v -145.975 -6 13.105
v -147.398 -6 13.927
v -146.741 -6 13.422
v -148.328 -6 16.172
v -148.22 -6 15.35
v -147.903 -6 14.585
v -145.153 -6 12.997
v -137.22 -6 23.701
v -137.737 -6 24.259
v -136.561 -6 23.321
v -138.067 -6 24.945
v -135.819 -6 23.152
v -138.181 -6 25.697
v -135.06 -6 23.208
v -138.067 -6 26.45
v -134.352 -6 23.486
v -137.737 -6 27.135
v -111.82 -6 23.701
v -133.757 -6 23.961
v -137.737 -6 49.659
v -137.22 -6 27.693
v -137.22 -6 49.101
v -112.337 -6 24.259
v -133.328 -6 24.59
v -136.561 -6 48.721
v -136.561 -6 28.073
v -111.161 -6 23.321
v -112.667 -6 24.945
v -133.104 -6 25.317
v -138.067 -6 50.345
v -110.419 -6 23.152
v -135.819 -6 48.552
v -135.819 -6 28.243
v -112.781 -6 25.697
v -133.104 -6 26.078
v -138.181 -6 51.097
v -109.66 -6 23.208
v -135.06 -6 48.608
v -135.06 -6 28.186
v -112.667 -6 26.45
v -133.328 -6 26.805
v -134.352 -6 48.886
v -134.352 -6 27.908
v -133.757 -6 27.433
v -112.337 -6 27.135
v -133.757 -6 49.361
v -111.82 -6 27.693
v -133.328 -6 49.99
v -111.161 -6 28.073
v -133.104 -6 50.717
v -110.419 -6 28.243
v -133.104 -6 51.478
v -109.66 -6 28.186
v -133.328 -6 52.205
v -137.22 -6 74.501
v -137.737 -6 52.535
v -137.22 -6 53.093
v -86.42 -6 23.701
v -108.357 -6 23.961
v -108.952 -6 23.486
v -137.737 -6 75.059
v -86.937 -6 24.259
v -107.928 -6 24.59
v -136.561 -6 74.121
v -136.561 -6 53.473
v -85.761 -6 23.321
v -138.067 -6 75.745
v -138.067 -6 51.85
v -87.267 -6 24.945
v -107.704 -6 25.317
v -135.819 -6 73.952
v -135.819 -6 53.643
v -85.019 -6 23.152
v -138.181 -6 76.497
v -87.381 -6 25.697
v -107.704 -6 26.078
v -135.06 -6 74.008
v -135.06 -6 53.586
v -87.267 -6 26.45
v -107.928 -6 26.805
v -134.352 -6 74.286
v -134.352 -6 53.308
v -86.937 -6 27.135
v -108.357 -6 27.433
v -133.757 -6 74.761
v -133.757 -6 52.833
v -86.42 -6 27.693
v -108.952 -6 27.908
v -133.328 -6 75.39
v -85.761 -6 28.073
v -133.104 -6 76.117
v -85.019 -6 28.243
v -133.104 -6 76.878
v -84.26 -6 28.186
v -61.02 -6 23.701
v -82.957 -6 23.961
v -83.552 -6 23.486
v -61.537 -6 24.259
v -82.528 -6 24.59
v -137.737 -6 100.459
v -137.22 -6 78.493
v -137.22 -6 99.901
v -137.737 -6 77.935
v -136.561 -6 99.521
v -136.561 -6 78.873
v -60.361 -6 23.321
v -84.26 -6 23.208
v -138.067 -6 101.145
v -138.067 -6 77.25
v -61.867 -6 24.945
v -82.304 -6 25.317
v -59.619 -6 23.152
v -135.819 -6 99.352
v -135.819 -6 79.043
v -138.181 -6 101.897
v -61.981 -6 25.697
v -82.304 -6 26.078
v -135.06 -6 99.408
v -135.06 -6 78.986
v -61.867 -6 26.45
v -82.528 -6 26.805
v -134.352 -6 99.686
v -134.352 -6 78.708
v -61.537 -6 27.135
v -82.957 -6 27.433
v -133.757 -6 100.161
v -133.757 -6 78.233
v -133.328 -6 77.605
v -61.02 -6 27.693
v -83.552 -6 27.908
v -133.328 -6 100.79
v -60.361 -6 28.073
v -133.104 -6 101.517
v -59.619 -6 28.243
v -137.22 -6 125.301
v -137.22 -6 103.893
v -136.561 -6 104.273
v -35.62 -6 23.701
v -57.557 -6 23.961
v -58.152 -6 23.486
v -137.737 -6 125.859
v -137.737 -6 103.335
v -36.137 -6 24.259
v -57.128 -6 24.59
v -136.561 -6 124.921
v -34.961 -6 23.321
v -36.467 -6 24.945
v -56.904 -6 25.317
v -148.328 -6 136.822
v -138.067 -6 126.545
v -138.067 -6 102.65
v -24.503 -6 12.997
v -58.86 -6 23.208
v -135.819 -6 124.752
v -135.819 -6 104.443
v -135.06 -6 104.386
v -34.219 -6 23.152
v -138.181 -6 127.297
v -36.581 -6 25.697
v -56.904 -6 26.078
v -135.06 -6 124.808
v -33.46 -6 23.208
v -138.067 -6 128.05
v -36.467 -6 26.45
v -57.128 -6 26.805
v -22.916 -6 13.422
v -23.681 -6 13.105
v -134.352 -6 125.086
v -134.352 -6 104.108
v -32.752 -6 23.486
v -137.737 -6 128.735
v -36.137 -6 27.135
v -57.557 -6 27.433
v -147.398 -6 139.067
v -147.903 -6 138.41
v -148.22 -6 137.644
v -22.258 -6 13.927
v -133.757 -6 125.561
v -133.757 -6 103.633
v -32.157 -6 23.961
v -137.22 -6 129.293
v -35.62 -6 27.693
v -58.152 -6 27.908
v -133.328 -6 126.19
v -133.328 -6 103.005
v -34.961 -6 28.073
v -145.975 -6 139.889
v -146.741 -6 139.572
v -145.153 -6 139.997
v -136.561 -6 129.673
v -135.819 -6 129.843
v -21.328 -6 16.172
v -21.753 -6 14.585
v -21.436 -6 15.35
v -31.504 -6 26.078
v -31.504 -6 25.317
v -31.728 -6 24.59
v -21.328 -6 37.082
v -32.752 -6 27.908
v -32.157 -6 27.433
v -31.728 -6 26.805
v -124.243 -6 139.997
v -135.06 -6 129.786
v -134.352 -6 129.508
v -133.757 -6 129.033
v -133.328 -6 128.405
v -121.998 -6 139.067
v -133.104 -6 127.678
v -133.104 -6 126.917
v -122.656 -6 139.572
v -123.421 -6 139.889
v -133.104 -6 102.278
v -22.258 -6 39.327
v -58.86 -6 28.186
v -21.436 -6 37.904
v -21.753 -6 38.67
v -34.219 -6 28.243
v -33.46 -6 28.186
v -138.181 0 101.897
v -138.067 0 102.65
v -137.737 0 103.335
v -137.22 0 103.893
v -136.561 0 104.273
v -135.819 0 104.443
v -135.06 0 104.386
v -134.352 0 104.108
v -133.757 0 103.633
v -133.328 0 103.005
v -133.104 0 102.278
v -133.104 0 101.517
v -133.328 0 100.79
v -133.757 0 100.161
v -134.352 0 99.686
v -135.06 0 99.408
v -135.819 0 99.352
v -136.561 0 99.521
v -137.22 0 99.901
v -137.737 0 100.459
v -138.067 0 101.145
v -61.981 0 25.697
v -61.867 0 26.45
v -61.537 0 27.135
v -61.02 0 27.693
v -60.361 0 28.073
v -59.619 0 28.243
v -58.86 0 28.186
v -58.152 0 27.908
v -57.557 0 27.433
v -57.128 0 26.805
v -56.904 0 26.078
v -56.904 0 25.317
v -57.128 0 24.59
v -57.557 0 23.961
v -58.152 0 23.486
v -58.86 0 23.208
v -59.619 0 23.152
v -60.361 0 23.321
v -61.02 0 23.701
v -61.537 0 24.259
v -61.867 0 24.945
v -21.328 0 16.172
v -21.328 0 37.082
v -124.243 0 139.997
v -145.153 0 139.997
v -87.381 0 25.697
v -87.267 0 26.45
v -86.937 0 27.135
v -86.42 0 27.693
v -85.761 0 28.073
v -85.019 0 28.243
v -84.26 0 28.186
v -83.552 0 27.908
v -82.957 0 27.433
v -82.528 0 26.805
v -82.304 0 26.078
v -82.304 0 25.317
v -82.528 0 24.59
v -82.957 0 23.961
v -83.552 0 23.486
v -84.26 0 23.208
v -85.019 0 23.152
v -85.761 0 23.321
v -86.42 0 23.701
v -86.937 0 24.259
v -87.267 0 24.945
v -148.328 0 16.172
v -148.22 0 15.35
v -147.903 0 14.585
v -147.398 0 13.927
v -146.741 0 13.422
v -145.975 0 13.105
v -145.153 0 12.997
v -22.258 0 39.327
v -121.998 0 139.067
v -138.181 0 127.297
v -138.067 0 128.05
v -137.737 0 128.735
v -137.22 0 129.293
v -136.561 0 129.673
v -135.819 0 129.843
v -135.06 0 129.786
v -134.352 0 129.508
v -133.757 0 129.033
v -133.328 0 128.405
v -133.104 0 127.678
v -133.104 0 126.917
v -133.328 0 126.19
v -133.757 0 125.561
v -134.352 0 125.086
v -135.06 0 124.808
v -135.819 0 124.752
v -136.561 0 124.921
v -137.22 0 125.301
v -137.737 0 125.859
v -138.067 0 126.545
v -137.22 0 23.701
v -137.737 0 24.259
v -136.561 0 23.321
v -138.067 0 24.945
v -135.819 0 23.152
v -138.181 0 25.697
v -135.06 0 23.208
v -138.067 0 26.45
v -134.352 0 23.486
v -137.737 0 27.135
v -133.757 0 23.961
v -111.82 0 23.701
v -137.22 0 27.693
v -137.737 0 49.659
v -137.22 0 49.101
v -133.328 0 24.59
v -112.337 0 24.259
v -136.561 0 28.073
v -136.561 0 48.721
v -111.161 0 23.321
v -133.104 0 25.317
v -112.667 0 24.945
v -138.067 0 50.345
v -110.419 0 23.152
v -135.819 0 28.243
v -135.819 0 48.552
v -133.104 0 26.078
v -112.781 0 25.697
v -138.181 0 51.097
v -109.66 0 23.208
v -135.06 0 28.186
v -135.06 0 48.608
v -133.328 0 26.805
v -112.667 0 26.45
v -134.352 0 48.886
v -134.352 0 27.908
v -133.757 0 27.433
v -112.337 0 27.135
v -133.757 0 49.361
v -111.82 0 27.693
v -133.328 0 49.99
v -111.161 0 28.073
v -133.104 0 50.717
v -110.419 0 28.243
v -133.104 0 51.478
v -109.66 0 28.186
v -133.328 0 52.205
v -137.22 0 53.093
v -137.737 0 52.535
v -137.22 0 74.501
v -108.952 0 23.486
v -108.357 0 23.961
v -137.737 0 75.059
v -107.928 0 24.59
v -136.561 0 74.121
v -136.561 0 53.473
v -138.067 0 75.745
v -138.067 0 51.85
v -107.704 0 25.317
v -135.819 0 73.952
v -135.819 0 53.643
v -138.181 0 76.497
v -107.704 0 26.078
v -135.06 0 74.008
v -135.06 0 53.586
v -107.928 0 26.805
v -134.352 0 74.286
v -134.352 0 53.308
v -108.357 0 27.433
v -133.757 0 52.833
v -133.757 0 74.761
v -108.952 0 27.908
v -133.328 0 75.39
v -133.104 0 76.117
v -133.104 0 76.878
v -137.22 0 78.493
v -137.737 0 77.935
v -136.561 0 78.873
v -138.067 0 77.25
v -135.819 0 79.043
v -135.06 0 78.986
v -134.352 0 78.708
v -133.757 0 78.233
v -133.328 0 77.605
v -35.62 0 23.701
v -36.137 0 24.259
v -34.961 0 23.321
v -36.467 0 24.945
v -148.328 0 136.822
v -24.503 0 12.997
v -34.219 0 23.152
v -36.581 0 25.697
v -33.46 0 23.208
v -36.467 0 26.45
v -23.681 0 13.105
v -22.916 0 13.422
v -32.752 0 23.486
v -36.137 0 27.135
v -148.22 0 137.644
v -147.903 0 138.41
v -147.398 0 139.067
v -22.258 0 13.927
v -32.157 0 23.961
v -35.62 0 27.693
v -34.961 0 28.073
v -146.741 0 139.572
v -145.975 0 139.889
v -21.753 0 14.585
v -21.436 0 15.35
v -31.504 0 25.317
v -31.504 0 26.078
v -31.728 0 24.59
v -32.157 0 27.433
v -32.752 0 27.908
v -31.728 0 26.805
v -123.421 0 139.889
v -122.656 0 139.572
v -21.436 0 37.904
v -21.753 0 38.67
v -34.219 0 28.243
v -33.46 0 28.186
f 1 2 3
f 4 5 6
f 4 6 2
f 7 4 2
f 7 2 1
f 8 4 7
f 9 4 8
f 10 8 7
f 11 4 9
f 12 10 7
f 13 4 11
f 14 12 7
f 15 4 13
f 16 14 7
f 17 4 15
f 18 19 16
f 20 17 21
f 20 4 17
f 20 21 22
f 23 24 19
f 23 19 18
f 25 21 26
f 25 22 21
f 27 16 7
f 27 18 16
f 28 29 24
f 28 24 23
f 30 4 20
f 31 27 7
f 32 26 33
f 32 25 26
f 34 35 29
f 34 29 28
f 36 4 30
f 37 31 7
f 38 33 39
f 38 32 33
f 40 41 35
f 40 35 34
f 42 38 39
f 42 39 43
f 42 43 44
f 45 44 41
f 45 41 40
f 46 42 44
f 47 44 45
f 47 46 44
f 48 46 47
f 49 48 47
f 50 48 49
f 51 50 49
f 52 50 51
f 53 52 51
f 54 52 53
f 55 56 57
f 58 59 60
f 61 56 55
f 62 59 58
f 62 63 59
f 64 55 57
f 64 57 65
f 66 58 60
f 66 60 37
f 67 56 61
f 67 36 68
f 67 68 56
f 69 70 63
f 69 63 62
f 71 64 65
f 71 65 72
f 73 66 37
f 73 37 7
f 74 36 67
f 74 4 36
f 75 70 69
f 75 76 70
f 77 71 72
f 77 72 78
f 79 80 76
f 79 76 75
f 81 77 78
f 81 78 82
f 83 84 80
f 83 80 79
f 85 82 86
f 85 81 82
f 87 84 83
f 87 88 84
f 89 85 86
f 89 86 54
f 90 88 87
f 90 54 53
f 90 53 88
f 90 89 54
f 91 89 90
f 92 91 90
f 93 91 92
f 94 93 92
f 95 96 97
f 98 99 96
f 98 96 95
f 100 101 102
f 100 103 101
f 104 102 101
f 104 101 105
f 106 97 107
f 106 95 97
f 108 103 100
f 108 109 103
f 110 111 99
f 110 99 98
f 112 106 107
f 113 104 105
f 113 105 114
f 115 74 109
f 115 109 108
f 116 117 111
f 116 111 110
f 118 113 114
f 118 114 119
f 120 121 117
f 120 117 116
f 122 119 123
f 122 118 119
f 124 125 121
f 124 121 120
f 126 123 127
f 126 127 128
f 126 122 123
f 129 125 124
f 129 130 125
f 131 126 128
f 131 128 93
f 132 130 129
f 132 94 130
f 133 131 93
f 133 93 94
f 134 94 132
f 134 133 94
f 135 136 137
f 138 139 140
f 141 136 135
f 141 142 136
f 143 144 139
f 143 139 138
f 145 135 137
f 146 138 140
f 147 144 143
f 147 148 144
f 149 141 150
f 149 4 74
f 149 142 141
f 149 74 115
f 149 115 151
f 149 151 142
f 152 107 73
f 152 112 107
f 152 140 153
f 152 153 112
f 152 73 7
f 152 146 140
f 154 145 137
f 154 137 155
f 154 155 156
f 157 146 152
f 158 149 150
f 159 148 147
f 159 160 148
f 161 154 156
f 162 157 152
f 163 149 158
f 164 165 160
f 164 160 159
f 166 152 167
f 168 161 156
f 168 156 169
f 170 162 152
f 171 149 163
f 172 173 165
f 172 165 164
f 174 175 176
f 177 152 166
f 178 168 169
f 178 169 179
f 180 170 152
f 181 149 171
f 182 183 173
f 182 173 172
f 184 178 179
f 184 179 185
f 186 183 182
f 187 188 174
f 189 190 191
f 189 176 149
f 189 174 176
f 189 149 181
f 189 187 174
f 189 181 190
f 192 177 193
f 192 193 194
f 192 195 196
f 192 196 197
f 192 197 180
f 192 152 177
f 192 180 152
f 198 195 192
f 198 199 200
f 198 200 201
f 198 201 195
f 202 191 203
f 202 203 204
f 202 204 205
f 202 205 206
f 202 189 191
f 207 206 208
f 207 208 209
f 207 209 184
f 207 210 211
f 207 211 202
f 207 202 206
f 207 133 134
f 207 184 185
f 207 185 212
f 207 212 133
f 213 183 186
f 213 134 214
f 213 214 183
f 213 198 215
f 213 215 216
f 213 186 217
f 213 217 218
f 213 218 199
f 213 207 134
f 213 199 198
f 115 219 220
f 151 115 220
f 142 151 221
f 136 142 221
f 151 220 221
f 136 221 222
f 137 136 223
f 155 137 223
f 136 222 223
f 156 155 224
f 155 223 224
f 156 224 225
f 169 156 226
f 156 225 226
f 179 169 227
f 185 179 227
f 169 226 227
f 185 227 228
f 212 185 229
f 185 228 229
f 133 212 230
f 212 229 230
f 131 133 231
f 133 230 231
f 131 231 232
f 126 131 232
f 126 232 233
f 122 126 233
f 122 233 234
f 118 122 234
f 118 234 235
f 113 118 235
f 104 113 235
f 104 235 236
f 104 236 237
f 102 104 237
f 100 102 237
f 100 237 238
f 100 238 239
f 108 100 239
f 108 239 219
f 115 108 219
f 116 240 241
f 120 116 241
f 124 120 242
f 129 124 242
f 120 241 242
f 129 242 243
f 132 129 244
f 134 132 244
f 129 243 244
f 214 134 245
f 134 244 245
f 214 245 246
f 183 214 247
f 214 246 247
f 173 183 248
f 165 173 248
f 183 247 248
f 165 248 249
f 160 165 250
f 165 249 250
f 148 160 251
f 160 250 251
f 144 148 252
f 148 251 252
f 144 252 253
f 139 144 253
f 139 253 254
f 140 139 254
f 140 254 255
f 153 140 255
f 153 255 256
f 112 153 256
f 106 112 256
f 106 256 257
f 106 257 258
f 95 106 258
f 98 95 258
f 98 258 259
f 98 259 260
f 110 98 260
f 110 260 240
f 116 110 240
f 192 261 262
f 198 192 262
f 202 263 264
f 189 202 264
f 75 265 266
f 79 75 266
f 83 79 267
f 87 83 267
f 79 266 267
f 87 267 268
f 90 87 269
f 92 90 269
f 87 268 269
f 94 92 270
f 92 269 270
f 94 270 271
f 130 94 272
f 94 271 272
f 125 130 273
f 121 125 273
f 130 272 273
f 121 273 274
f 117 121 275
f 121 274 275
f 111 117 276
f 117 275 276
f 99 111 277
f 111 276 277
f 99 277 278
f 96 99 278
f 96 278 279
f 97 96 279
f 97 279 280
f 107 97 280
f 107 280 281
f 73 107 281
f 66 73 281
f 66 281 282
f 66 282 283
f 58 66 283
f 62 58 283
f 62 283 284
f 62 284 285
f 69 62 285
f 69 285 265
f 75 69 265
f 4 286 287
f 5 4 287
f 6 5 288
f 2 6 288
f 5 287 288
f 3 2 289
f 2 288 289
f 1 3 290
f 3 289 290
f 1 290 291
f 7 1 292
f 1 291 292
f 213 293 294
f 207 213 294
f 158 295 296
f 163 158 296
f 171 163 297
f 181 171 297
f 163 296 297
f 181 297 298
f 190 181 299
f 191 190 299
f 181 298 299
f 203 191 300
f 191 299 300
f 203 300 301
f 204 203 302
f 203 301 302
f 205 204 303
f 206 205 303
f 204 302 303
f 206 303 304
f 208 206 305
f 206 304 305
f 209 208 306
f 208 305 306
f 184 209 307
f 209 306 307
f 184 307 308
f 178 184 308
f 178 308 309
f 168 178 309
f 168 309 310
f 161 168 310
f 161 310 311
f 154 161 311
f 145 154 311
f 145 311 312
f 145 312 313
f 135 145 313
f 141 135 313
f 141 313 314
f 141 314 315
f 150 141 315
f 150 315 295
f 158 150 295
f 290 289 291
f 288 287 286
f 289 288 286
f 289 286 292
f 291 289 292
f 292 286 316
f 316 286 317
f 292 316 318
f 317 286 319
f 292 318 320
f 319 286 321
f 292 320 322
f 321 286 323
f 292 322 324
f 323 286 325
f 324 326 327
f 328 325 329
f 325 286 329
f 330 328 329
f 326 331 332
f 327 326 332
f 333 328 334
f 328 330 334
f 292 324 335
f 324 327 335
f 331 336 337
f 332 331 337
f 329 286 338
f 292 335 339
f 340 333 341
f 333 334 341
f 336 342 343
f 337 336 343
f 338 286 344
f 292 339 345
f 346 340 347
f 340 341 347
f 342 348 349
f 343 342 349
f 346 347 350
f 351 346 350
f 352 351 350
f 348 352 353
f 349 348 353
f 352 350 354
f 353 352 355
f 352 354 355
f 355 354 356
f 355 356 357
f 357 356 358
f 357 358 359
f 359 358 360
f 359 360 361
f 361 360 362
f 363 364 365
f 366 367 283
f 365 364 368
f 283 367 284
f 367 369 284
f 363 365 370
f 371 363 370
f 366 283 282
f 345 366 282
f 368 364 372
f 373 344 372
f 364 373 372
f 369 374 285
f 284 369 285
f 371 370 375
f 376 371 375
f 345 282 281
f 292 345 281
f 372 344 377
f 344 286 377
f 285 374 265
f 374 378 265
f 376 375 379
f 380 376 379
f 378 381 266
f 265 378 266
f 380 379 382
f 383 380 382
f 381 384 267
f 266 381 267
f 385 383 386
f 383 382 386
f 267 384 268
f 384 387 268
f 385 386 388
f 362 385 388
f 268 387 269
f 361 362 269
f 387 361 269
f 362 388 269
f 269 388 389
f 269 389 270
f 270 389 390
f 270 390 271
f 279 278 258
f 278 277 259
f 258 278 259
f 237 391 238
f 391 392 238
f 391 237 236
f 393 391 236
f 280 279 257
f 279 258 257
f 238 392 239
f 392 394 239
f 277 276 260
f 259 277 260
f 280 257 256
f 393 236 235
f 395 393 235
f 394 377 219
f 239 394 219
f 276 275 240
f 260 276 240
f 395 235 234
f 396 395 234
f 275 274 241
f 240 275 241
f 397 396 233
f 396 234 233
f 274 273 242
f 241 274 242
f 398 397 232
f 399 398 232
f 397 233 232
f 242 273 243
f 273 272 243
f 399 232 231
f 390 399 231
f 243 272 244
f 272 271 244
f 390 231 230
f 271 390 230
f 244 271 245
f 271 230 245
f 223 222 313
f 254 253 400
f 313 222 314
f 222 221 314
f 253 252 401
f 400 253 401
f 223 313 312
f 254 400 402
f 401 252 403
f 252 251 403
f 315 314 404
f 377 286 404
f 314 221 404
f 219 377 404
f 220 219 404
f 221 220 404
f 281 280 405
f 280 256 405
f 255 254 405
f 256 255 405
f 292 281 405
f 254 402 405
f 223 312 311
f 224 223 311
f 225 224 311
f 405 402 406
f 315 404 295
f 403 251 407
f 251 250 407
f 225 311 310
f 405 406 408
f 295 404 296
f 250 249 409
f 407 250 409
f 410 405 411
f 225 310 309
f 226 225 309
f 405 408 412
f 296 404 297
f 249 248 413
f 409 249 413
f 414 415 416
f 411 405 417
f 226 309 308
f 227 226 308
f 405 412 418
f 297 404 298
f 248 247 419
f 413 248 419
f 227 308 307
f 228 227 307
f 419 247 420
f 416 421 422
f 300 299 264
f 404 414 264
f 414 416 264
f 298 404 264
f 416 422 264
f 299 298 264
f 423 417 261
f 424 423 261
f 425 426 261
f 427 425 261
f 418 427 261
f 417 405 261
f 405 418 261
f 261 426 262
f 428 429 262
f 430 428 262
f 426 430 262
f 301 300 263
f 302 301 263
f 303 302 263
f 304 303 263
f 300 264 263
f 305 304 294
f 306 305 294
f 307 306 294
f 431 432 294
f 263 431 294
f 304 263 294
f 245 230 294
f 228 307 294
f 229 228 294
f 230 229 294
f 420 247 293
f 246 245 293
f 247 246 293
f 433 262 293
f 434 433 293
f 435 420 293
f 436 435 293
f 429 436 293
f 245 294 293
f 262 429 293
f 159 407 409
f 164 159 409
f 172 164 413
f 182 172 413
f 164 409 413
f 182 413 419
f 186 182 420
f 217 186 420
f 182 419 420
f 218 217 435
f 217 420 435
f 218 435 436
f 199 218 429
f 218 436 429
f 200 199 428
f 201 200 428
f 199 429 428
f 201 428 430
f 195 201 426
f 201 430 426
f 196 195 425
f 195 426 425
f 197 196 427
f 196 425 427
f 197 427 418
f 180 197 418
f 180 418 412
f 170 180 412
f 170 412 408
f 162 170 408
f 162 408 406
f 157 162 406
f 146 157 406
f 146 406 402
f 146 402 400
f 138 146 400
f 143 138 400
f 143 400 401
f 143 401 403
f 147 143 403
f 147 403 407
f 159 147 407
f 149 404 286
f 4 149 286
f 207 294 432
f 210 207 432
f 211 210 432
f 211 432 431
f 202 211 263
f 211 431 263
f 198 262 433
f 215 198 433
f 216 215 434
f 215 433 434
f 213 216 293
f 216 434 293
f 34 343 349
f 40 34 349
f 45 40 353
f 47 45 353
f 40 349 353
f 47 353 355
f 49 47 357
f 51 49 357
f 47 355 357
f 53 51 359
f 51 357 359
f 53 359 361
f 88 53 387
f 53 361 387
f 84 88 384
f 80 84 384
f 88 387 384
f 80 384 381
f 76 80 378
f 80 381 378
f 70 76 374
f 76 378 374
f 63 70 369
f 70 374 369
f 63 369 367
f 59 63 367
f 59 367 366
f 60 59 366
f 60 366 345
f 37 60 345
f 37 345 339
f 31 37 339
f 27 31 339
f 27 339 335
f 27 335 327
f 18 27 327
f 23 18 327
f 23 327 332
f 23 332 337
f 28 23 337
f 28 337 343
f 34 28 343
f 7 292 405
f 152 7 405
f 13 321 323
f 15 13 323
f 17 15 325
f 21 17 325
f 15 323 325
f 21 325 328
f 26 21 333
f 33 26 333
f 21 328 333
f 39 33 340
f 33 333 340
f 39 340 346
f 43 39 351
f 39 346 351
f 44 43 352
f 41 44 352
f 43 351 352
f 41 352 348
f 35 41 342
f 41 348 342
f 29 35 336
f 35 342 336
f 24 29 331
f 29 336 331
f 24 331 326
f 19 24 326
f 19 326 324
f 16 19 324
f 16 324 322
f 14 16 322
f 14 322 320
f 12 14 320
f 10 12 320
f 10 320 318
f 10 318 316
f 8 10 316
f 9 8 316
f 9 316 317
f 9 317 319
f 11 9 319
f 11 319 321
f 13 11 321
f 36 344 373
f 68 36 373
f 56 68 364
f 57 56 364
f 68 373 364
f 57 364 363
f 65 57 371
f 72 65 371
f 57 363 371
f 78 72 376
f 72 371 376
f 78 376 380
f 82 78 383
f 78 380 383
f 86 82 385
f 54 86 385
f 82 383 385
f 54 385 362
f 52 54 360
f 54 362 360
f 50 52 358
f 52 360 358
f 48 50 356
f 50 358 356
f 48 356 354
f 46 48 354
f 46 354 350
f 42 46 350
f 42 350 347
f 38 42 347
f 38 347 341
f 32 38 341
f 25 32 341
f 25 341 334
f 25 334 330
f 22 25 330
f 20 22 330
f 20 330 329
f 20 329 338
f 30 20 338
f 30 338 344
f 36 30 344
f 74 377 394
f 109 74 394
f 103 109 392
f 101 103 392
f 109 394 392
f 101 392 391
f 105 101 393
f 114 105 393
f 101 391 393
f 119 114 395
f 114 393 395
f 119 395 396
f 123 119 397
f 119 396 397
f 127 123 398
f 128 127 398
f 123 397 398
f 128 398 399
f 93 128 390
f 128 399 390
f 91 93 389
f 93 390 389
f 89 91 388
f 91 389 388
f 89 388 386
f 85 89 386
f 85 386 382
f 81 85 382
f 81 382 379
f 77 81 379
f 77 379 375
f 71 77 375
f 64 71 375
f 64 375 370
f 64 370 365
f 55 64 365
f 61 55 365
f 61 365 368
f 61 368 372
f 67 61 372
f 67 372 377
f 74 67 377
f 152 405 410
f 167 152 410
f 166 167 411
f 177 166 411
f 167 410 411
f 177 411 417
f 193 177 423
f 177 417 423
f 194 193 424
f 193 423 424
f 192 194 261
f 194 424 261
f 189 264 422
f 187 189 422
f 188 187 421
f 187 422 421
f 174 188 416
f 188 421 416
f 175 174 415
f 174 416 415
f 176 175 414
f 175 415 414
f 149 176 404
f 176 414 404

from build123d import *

# Parameters (mm, degrees)
F1_DEPTH = 6
F3_D     = 5.1054
F3_DEPTH = 50.8


with BuildPart() as f1:
    # F0 (on Front) → F1 (new body)
    with BuildSketch(Plane.XZ):
        with BuildLine():
            ThreePointArc((-145.15302, 139.997129), (-147.398084, 139.067193), (-148.32802, 136.822129))
            Line((-148.32802, 136.822129), (-148.32802, 16.172129))
            ThreePointArc((-148.32802, 16.172129), (-147.398084, 13.927065), (-145.15302, 12.997129))
            Line((-145.15302, 12.997129), (-24.50302, 12.997129))
            ThreePointArc((-24.50302, 12.997129), (-22.257956, 13.927065), (-21.32802, 16.172129))
            Line((-21.32802, 16.172129), (-21.32802, 37.082001))
            ThreePointArc((-21.32802, 37.082001), (-21.569703, 38.297021), (-22.257956, 39.327065))
            Line((-22.257956, 39.327065), (-121.998084, 139.067193))
            ThreePointArc((-121.998084, 139.067193), (-123.028128, 139.755447), (-124.243148, 139.997129))
            Line((-124.243148, 139.997129), (-145.15302, 139.997129))
        make_face()
    extrude(amount=F1_DEPTH)

    # F3
    with Locations(Plane.XZ.offset(6)):
        with Locations((-135.62802, 76.497129), (-135.62802, 51.097129), (-135.62802, 25.697129), (-135.62802, 101.897129), (-135.62802, 127.297129), (-110.22802, 25.697129), (-84.82802, 25.697129), (-59.42802, 25.697129), (-34.02802, 25.697129)):
            Hole(F3_D / 2, depth=F3_DEPTH)


solid = f1.part
